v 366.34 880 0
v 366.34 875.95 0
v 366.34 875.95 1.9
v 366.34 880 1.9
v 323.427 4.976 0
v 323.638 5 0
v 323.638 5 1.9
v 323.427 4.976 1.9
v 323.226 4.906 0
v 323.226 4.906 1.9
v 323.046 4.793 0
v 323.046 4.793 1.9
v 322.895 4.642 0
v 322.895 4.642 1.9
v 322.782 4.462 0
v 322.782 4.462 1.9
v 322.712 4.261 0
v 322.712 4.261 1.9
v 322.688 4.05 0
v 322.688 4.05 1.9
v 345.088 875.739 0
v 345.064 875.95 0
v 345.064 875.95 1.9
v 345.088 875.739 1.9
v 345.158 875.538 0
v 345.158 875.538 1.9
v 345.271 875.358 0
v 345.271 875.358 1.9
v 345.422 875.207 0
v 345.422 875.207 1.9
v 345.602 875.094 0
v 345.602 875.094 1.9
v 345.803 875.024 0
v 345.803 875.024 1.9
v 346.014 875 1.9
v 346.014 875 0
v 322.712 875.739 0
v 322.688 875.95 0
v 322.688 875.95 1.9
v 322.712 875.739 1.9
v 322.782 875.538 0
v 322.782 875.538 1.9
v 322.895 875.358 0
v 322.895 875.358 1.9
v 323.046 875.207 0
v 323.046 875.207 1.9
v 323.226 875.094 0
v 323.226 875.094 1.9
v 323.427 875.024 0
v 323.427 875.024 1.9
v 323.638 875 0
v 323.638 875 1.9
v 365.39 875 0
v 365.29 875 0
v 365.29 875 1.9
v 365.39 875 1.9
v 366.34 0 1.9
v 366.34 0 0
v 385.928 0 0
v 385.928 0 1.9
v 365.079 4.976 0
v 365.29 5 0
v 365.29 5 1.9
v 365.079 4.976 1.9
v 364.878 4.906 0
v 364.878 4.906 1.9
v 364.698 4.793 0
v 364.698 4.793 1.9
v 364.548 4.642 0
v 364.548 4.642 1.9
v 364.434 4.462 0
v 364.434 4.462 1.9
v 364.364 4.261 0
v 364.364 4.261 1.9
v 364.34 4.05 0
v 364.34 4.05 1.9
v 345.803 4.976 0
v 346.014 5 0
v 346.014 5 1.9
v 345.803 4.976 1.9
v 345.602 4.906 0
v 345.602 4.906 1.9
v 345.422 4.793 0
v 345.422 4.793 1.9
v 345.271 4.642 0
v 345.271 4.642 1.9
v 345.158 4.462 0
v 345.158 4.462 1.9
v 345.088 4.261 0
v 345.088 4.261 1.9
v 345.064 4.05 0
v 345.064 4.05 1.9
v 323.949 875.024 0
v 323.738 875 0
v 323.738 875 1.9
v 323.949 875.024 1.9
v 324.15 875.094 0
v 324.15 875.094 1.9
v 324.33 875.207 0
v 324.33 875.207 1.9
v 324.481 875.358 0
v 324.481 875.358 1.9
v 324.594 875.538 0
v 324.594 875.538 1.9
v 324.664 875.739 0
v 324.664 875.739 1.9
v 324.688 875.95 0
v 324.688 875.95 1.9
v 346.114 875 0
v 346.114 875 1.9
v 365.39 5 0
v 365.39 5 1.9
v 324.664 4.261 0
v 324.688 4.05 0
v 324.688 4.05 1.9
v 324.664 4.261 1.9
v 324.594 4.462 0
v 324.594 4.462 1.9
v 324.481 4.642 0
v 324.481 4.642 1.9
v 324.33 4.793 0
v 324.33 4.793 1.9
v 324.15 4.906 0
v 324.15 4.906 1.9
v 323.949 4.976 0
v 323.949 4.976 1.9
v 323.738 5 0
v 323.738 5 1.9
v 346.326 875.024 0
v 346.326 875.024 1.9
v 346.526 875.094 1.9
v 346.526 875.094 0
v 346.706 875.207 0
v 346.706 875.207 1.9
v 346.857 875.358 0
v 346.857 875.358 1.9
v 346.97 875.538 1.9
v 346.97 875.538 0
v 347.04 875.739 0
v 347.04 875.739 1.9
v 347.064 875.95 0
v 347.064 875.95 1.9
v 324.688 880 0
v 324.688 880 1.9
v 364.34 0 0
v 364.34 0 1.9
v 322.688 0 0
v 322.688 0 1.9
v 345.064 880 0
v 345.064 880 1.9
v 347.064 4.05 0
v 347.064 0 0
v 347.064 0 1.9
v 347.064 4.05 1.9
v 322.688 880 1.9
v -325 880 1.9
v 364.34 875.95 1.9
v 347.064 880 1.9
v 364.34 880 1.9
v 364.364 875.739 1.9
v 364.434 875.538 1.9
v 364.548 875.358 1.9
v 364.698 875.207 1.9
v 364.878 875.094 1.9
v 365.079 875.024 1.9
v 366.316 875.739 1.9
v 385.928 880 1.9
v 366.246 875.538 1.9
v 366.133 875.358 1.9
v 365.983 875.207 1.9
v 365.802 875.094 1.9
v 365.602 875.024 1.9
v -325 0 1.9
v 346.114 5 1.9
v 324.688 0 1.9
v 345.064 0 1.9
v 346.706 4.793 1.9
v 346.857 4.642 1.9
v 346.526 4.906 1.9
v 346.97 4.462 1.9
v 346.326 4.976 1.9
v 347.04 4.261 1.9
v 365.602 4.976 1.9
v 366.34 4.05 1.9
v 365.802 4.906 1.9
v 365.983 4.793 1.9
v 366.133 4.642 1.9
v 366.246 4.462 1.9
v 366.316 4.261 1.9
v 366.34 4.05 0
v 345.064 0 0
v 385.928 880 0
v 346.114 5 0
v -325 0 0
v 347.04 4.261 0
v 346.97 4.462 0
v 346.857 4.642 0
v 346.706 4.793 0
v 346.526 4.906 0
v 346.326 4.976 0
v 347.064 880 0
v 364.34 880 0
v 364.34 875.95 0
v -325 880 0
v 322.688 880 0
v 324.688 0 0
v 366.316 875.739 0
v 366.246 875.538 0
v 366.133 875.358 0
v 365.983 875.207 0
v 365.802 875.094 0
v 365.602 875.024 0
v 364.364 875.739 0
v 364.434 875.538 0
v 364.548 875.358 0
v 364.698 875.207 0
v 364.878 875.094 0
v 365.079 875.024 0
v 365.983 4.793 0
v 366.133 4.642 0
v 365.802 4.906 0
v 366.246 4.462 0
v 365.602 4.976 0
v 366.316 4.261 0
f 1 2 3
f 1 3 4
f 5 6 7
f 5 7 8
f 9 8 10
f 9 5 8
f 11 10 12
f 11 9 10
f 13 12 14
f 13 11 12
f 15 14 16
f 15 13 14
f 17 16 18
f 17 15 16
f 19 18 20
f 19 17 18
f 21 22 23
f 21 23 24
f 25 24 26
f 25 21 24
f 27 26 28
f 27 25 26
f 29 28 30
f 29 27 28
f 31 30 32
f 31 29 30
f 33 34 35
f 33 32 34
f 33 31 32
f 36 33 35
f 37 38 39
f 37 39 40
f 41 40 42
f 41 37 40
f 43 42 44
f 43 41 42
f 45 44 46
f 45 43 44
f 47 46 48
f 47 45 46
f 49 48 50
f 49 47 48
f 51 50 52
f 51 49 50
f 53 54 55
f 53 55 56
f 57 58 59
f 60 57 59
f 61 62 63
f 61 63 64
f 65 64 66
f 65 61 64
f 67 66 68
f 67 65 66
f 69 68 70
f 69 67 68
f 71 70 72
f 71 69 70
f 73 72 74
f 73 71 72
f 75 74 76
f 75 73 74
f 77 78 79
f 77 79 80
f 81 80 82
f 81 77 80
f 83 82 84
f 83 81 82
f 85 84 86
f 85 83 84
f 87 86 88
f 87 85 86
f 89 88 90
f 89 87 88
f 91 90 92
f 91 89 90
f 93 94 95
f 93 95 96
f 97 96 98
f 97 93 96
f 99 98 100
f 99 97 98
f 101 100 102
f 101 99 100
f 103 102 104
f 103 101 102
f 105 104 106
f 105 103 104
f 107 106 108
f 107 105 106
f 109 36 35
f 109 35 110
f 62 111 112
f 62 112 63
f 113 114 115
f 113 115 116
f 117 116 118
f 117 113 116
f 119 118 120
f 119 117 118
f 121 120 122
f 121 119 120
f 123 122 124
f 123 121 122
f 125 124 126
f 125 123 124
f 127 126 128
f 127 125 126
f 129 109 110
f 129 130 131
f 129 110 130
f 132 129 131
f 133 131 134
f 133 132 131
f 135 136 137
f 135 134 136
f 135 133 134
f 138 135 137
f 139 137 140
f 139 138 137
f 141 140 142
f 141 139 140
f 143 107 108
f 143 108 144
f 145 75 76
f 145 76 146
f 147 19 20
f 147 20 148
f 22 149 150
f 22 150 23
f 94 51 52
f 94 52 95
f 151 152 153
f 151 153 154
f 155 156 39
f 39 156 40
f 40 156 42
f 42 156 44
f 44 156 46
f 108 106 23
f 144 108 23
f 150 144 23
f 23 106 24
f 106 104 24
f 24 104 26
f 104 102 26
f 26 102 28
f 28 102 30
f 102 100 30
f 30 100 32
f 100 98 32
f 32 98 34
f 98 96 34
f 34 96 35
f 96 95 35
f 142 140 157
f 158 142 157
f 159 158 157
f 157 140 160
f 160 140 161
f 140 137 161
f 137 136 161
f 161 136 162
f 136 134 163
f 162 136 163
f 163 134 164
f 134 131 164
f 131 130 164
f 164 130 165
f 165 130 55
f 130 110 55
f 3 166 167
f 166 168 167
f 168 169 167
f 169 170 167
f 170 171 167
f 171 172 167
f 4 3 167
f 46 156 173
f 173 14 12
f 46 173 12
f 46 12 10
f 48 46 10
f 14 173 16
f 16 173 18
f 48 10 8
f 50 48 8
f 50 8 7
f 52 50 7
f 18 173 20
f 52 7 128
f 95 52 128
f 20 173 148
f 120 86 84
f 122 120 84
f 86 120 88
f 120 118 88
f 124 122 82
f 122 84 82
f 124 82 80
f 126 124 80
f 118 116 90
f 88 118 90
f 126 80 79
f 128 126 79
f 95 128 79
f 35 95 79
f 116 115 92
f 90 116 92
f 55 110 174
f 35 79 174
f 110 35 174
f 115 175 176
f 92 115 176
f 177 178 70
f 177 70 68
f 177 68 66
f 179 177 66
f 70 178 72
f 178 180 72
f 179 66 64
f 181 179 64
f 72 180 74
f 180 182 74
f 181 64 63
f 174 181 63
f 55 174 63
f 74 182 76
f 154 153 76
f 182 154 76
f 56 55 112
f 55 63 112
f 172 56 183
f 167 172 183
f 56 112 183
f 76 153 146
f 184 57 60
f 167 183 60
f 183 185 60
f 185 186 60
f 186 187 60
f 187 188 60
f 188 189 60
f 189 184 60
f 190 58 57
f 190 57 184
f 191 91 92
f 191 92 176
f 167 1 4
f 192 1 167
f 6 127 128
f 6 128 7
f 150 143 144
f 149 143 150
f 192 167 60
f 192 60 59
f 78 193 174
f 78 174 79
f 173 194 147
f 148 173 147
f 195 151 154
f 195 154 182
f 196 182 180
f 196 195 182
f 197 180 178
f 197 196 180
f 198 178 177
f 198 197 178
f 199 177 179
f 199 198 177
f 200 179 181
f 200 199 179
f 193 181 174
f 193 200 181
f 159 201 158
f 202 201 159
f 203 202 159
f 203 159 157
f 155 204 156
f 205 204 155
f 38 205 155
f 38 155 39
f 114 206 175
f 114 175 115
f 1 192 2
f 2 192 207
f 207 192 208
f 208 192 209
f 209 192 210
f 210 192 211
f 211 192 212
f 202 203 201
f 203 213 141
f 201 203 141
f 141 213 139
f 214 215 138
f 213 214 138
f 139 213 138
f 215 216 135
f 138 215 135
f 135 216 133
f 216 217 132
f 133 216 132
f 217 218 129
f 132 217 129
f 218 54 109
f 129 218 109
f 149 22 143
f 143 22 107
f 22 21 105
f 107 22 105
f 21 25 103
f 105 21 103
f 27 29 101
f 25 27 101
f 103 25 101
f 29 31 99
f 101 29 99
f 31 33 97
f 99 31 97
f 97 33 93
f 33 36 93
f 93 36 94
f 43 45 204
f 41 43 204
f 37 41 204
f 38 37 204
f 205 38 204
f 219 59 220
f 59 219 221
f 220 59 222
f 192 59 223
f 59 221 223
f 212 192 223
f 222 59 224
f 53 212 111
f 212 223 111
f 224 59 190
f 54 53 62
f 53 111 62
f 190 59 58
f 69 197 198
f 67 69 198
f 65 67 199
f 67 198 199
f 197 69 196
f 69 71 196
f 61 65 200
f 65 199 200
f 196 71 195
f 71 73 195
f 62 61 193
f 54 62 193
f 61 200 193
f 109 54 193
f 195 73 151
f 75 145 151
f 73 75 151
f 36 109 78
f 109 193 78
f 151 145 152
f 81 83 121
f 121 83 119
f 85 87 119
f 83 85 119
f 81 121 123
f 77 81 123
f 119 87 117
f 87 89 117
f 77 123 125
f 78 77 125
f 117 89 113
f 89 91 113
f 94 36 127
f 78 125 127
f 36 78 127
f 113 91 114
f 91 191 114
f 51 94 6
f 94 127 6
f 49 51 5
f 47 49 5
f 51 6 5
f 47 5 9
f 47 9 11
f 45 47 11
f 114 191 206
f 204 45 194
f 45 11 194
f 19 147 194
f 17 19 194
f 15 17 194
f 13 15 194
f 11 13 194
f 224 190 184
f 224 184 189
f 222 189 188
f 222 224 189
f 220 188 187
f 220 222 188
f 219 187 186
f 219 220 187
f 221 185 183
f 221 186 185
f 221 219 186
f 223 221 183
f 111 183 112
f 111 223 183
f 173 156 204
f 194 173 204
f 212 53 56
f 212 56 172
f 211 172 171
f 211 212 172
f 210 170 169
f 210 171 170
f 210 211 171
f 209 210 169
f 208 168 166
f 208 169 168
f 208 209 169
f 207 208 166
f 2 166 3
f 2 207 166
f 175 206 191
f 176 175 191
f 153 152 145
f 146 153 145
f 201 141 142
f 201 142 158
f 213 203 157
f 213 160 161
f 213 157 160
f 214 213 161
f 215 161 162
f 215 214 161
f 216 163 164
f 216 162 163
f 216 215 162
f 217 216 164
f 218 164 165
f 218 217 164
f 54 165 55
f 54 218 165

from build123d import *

# Parameters (mm, degrees)
BRIDA_BASE2_DEPTH          = 880
DESDOBLAR1_DEPTH           = 880
DESDOBLAR1_2_DEPTH         = 880
CORTAR_EXTRUIR1_DEPTH      = 961.908046857
CORTAR_EXTRUIR1_DEPTH_BACK = 961.908046857


# Read off the part's stored shape, not the designer's step: Desdoblar1
# Sheet-metal steps are written as plain solids
with BuildPart() as part:
    # Croquis55 → Brida base2 (new body)
    with BuildSketch(Plane(origin=(0, 0, 0), x_dir=(1, 0, 0), z_dir=(0, 1, 0))):
        with BuildLine():
            Line((-325, 0), (322.3634, 0))
            ThreePointArc((322.3634, 0), (324.227757739, -0.772242261), (325, -2.6366))
            Line((325, -2.6366), (325, -22.3634))
            ThreePointArc((325, -22.3634), (324.227757739, -24.227757739), (322.3634, -25))
            Line((322.3634, -25), (305.7366, -25))
            ThreePointArc((305.7366, -25), (305.215745145, -25.215745145), (305, -25.7366))
            Line((305, -25.7366), (305, -45))
            Line((305, -45), (303.1, -45))
            Line((303.1, -45), (303.1, -25.7366))
            ThreePointArc((303.1, -25.7366), (303.872242261, -23.872242261), (305.7366, -23.1))
            Line((305.7366, -23.1), (322.3634, -23.1))
            ThreePointArc((322.3634, -23.1), (322.884254855, -22.884254855), (323.1, -22.3634))
            Line((323.1, -22.3634), (323.1, -2.6366))
            ThreePointArc((323.1, -2.6366), (322.884254855, -2.115745145), (322.3634, -1.9))
            Line((322.3634, -1.9), (-325, -1.9))
            Line((-325, -1.9), (-325, 0))
        make_face()
    extrude(amount=BRIDA_BASE2_DEPTH)

    # Desdoblar1 outline → Desdoblar1 (cut)
    with BuildSketch(Plane(origin=(0, 0, 0), x_dir=(1, 0, 0), z_dir=(0, 1, 0))):
        with BuildLine():
            ThreePointArc((325, -2.6366), (324.973622072, -2.264578098), (324.895016084, -1.9))
            Line((324.895016084, -1.9), (322.3634, -1.9))
            ThreePointArc((322.3634, -1.9), (322.884254855, -2.115745145), (323.1, -2.6366))
            Line((323.1, -2.6366), (323.1, -22.3634))
            ThreePointArc((323.1, -22.3634), (322.884254855, -22.884254855), (322.3634, -23.1))
            Line((322.3634, -23.1), (305.7366, -23.1))
            ThreePointArc((305.7366, -23.1), (303.872242261, -23.872242261), (303.1, -25.7366))
            Line((303.1, -25.7366), (303.1, -45))
            Line((303.1, -45), (305, -45))
            Line((305, -45), (305, -25.7366))
            ThreePointArc((305, -25.7366), (305.215745145, -25.215745145), (305.7366, -25))
            Line((305.7366, -25), (322.3634, -25))
            ThreePointArc((322.3634, -25), (324.227757739, -24.227757739), (325, -22.3634))
            Line((325, -22.3634), (325, -2.6366))
        make_face()
    extrude(amount=DESDOBLAR1_DEPTH, mode=Mode.SUBTRACT)

    # Desdoblar1 2 outline → Desdoblar1 2 (add)
    with BuildSketch(Plane(origin=(0, 0, 0), x_dir=(1, 0, 0), z_dir=(0, 1, 0))):
        with BuildLine():
            Line((385.928315254, 0), (322.3634, 0))
            ThreePointArc((322.3634, 0), (323.946046517, -0.527835063), (324.895016084, -1.9))
            Line((324.895016084, -1.9), (385.928315254, -1.9))
            Line((385.928315254, -1.9), (385.928315254, 0))
        make_face()
    extrude(amount=DESDOBLAR1_2_DEPTH)

    # Croquis64 → Cortar-Extruir1 (cut, two sides: drawn at the far end of the back side and taken through both)
    with BuildSketch(Plane.XY.offset(1.9).offset(-CORTAR_EXTRUIR1_DEPTH_BACK)):
        with BuildLine():
            Line((322.688052542, 0), (324.688052542, 0))
            Line((324.688052542, 0), (324.688052542, 4.05))
            ThreePointArc((324.688052542, 4.05), (324.409803985, 4.721751442), (323.738052542, 5))
            Line((323.738052542, 5), (323.638052542, 5))
            ThreePointArc((323.638052542, 5), (322.9663011, 4.721751442), (322.688052542, 4.05))
            Line((322.688052542, 4.05), (322.688052542, 0))
        make_face()
        with BuildLine():
            Line((345.064157627, 0), (347.064157627, 0))
            Line((347.064157627, 0), (347.064157627, 4.05))
            ThreePointArc((347.064157627, 4.05), (346.785909069, 4.721751442), (346.114157627, 5))
            Line((346.114157627, 5), (346.014157627, 5))
            ThreePointArc((346.014157627, 5), (345.342406185, 4.721751442), (345.064157627, 4.05))
            Line((345.064157627, 4.05), (345.064157627, 0))
        make_face()
        with BuildLine():
            Line((364.340262712, 0), (366.340262712, 0))
            Line((366.340262712, 0), (366.340262712, 4.05))
            ThreePointArc((366.340262712, 4.05), (366.062014154, 4.721751442), (365.390262712, 5))
            Line((365.390262712, 5), (365.290262712, 5))
            ThreePointArc((365.290262712, 5), (364.61851127, 4.721751442), (364.340262712, 4.05))
            Line((364.340262712, 4.05), (364.340262712, 0))
        make_face()
        with BuildLine():
            Line((364.340262712, 880), (364.340262712, 875.95))
            ThreePointArc((364.340262712, 875.95), (364.61851127, 875.278248558), (365.290262712, 875))
            Line((365.290262712, 875), (365.390262712, 875))
            ThreePointArc((365.390262712, 875), (366.062014154, 875.278248558), (366.340262712, 875.95))
            Line((366.340262712, 875.95), (366.340262712, 880))
            Line((366.340262712, 880), (364.340262712, 880))
        make_face()
        with BuildLine():
            Line((345.064157627, 880), (345.064157627, 875.95))
            ThreePointArc((345.064157627, 875.95), (345.342406185, 875.278248558), (346.014157627, 875))
            Line((346.014157627, 875), (346.114157627, 875))
            ThreePointArc((346.114157627, 875), (346.785909069, 875.278248558), (347.064157627, 875.95))
            Line((347.064157627, 875.95), (347.064157627, 880))
            Line((347.064157627, 880), (345.064157627, 880))
        make_face()
        with BuildLine():
            Line((322.688052542, 880), (322.688052542, 875.95))
            ThreePointArc((322.688052542, 875.95), (322.9663011, 875.278248558), (323.638052542, 875))
            Line((323.638052542, 875), (323.738052542, 875))
            ThreePointArc((323.738052542, 875), (324.409803985, 875.278248558), (324.688052542, 875.95))
            Line((324.688052542, 875.95), (324.688052542, 880))
            Line((324.688052542, 880), (322.688052542, 880))
        make_face()
    extrude(amount=CORTAR_EXTRUIR1_DEPTH + CORTAR_EXTRUIR1_DEPTH_BACK, mode=Mode.SUBTRACT)


solid = part.part
